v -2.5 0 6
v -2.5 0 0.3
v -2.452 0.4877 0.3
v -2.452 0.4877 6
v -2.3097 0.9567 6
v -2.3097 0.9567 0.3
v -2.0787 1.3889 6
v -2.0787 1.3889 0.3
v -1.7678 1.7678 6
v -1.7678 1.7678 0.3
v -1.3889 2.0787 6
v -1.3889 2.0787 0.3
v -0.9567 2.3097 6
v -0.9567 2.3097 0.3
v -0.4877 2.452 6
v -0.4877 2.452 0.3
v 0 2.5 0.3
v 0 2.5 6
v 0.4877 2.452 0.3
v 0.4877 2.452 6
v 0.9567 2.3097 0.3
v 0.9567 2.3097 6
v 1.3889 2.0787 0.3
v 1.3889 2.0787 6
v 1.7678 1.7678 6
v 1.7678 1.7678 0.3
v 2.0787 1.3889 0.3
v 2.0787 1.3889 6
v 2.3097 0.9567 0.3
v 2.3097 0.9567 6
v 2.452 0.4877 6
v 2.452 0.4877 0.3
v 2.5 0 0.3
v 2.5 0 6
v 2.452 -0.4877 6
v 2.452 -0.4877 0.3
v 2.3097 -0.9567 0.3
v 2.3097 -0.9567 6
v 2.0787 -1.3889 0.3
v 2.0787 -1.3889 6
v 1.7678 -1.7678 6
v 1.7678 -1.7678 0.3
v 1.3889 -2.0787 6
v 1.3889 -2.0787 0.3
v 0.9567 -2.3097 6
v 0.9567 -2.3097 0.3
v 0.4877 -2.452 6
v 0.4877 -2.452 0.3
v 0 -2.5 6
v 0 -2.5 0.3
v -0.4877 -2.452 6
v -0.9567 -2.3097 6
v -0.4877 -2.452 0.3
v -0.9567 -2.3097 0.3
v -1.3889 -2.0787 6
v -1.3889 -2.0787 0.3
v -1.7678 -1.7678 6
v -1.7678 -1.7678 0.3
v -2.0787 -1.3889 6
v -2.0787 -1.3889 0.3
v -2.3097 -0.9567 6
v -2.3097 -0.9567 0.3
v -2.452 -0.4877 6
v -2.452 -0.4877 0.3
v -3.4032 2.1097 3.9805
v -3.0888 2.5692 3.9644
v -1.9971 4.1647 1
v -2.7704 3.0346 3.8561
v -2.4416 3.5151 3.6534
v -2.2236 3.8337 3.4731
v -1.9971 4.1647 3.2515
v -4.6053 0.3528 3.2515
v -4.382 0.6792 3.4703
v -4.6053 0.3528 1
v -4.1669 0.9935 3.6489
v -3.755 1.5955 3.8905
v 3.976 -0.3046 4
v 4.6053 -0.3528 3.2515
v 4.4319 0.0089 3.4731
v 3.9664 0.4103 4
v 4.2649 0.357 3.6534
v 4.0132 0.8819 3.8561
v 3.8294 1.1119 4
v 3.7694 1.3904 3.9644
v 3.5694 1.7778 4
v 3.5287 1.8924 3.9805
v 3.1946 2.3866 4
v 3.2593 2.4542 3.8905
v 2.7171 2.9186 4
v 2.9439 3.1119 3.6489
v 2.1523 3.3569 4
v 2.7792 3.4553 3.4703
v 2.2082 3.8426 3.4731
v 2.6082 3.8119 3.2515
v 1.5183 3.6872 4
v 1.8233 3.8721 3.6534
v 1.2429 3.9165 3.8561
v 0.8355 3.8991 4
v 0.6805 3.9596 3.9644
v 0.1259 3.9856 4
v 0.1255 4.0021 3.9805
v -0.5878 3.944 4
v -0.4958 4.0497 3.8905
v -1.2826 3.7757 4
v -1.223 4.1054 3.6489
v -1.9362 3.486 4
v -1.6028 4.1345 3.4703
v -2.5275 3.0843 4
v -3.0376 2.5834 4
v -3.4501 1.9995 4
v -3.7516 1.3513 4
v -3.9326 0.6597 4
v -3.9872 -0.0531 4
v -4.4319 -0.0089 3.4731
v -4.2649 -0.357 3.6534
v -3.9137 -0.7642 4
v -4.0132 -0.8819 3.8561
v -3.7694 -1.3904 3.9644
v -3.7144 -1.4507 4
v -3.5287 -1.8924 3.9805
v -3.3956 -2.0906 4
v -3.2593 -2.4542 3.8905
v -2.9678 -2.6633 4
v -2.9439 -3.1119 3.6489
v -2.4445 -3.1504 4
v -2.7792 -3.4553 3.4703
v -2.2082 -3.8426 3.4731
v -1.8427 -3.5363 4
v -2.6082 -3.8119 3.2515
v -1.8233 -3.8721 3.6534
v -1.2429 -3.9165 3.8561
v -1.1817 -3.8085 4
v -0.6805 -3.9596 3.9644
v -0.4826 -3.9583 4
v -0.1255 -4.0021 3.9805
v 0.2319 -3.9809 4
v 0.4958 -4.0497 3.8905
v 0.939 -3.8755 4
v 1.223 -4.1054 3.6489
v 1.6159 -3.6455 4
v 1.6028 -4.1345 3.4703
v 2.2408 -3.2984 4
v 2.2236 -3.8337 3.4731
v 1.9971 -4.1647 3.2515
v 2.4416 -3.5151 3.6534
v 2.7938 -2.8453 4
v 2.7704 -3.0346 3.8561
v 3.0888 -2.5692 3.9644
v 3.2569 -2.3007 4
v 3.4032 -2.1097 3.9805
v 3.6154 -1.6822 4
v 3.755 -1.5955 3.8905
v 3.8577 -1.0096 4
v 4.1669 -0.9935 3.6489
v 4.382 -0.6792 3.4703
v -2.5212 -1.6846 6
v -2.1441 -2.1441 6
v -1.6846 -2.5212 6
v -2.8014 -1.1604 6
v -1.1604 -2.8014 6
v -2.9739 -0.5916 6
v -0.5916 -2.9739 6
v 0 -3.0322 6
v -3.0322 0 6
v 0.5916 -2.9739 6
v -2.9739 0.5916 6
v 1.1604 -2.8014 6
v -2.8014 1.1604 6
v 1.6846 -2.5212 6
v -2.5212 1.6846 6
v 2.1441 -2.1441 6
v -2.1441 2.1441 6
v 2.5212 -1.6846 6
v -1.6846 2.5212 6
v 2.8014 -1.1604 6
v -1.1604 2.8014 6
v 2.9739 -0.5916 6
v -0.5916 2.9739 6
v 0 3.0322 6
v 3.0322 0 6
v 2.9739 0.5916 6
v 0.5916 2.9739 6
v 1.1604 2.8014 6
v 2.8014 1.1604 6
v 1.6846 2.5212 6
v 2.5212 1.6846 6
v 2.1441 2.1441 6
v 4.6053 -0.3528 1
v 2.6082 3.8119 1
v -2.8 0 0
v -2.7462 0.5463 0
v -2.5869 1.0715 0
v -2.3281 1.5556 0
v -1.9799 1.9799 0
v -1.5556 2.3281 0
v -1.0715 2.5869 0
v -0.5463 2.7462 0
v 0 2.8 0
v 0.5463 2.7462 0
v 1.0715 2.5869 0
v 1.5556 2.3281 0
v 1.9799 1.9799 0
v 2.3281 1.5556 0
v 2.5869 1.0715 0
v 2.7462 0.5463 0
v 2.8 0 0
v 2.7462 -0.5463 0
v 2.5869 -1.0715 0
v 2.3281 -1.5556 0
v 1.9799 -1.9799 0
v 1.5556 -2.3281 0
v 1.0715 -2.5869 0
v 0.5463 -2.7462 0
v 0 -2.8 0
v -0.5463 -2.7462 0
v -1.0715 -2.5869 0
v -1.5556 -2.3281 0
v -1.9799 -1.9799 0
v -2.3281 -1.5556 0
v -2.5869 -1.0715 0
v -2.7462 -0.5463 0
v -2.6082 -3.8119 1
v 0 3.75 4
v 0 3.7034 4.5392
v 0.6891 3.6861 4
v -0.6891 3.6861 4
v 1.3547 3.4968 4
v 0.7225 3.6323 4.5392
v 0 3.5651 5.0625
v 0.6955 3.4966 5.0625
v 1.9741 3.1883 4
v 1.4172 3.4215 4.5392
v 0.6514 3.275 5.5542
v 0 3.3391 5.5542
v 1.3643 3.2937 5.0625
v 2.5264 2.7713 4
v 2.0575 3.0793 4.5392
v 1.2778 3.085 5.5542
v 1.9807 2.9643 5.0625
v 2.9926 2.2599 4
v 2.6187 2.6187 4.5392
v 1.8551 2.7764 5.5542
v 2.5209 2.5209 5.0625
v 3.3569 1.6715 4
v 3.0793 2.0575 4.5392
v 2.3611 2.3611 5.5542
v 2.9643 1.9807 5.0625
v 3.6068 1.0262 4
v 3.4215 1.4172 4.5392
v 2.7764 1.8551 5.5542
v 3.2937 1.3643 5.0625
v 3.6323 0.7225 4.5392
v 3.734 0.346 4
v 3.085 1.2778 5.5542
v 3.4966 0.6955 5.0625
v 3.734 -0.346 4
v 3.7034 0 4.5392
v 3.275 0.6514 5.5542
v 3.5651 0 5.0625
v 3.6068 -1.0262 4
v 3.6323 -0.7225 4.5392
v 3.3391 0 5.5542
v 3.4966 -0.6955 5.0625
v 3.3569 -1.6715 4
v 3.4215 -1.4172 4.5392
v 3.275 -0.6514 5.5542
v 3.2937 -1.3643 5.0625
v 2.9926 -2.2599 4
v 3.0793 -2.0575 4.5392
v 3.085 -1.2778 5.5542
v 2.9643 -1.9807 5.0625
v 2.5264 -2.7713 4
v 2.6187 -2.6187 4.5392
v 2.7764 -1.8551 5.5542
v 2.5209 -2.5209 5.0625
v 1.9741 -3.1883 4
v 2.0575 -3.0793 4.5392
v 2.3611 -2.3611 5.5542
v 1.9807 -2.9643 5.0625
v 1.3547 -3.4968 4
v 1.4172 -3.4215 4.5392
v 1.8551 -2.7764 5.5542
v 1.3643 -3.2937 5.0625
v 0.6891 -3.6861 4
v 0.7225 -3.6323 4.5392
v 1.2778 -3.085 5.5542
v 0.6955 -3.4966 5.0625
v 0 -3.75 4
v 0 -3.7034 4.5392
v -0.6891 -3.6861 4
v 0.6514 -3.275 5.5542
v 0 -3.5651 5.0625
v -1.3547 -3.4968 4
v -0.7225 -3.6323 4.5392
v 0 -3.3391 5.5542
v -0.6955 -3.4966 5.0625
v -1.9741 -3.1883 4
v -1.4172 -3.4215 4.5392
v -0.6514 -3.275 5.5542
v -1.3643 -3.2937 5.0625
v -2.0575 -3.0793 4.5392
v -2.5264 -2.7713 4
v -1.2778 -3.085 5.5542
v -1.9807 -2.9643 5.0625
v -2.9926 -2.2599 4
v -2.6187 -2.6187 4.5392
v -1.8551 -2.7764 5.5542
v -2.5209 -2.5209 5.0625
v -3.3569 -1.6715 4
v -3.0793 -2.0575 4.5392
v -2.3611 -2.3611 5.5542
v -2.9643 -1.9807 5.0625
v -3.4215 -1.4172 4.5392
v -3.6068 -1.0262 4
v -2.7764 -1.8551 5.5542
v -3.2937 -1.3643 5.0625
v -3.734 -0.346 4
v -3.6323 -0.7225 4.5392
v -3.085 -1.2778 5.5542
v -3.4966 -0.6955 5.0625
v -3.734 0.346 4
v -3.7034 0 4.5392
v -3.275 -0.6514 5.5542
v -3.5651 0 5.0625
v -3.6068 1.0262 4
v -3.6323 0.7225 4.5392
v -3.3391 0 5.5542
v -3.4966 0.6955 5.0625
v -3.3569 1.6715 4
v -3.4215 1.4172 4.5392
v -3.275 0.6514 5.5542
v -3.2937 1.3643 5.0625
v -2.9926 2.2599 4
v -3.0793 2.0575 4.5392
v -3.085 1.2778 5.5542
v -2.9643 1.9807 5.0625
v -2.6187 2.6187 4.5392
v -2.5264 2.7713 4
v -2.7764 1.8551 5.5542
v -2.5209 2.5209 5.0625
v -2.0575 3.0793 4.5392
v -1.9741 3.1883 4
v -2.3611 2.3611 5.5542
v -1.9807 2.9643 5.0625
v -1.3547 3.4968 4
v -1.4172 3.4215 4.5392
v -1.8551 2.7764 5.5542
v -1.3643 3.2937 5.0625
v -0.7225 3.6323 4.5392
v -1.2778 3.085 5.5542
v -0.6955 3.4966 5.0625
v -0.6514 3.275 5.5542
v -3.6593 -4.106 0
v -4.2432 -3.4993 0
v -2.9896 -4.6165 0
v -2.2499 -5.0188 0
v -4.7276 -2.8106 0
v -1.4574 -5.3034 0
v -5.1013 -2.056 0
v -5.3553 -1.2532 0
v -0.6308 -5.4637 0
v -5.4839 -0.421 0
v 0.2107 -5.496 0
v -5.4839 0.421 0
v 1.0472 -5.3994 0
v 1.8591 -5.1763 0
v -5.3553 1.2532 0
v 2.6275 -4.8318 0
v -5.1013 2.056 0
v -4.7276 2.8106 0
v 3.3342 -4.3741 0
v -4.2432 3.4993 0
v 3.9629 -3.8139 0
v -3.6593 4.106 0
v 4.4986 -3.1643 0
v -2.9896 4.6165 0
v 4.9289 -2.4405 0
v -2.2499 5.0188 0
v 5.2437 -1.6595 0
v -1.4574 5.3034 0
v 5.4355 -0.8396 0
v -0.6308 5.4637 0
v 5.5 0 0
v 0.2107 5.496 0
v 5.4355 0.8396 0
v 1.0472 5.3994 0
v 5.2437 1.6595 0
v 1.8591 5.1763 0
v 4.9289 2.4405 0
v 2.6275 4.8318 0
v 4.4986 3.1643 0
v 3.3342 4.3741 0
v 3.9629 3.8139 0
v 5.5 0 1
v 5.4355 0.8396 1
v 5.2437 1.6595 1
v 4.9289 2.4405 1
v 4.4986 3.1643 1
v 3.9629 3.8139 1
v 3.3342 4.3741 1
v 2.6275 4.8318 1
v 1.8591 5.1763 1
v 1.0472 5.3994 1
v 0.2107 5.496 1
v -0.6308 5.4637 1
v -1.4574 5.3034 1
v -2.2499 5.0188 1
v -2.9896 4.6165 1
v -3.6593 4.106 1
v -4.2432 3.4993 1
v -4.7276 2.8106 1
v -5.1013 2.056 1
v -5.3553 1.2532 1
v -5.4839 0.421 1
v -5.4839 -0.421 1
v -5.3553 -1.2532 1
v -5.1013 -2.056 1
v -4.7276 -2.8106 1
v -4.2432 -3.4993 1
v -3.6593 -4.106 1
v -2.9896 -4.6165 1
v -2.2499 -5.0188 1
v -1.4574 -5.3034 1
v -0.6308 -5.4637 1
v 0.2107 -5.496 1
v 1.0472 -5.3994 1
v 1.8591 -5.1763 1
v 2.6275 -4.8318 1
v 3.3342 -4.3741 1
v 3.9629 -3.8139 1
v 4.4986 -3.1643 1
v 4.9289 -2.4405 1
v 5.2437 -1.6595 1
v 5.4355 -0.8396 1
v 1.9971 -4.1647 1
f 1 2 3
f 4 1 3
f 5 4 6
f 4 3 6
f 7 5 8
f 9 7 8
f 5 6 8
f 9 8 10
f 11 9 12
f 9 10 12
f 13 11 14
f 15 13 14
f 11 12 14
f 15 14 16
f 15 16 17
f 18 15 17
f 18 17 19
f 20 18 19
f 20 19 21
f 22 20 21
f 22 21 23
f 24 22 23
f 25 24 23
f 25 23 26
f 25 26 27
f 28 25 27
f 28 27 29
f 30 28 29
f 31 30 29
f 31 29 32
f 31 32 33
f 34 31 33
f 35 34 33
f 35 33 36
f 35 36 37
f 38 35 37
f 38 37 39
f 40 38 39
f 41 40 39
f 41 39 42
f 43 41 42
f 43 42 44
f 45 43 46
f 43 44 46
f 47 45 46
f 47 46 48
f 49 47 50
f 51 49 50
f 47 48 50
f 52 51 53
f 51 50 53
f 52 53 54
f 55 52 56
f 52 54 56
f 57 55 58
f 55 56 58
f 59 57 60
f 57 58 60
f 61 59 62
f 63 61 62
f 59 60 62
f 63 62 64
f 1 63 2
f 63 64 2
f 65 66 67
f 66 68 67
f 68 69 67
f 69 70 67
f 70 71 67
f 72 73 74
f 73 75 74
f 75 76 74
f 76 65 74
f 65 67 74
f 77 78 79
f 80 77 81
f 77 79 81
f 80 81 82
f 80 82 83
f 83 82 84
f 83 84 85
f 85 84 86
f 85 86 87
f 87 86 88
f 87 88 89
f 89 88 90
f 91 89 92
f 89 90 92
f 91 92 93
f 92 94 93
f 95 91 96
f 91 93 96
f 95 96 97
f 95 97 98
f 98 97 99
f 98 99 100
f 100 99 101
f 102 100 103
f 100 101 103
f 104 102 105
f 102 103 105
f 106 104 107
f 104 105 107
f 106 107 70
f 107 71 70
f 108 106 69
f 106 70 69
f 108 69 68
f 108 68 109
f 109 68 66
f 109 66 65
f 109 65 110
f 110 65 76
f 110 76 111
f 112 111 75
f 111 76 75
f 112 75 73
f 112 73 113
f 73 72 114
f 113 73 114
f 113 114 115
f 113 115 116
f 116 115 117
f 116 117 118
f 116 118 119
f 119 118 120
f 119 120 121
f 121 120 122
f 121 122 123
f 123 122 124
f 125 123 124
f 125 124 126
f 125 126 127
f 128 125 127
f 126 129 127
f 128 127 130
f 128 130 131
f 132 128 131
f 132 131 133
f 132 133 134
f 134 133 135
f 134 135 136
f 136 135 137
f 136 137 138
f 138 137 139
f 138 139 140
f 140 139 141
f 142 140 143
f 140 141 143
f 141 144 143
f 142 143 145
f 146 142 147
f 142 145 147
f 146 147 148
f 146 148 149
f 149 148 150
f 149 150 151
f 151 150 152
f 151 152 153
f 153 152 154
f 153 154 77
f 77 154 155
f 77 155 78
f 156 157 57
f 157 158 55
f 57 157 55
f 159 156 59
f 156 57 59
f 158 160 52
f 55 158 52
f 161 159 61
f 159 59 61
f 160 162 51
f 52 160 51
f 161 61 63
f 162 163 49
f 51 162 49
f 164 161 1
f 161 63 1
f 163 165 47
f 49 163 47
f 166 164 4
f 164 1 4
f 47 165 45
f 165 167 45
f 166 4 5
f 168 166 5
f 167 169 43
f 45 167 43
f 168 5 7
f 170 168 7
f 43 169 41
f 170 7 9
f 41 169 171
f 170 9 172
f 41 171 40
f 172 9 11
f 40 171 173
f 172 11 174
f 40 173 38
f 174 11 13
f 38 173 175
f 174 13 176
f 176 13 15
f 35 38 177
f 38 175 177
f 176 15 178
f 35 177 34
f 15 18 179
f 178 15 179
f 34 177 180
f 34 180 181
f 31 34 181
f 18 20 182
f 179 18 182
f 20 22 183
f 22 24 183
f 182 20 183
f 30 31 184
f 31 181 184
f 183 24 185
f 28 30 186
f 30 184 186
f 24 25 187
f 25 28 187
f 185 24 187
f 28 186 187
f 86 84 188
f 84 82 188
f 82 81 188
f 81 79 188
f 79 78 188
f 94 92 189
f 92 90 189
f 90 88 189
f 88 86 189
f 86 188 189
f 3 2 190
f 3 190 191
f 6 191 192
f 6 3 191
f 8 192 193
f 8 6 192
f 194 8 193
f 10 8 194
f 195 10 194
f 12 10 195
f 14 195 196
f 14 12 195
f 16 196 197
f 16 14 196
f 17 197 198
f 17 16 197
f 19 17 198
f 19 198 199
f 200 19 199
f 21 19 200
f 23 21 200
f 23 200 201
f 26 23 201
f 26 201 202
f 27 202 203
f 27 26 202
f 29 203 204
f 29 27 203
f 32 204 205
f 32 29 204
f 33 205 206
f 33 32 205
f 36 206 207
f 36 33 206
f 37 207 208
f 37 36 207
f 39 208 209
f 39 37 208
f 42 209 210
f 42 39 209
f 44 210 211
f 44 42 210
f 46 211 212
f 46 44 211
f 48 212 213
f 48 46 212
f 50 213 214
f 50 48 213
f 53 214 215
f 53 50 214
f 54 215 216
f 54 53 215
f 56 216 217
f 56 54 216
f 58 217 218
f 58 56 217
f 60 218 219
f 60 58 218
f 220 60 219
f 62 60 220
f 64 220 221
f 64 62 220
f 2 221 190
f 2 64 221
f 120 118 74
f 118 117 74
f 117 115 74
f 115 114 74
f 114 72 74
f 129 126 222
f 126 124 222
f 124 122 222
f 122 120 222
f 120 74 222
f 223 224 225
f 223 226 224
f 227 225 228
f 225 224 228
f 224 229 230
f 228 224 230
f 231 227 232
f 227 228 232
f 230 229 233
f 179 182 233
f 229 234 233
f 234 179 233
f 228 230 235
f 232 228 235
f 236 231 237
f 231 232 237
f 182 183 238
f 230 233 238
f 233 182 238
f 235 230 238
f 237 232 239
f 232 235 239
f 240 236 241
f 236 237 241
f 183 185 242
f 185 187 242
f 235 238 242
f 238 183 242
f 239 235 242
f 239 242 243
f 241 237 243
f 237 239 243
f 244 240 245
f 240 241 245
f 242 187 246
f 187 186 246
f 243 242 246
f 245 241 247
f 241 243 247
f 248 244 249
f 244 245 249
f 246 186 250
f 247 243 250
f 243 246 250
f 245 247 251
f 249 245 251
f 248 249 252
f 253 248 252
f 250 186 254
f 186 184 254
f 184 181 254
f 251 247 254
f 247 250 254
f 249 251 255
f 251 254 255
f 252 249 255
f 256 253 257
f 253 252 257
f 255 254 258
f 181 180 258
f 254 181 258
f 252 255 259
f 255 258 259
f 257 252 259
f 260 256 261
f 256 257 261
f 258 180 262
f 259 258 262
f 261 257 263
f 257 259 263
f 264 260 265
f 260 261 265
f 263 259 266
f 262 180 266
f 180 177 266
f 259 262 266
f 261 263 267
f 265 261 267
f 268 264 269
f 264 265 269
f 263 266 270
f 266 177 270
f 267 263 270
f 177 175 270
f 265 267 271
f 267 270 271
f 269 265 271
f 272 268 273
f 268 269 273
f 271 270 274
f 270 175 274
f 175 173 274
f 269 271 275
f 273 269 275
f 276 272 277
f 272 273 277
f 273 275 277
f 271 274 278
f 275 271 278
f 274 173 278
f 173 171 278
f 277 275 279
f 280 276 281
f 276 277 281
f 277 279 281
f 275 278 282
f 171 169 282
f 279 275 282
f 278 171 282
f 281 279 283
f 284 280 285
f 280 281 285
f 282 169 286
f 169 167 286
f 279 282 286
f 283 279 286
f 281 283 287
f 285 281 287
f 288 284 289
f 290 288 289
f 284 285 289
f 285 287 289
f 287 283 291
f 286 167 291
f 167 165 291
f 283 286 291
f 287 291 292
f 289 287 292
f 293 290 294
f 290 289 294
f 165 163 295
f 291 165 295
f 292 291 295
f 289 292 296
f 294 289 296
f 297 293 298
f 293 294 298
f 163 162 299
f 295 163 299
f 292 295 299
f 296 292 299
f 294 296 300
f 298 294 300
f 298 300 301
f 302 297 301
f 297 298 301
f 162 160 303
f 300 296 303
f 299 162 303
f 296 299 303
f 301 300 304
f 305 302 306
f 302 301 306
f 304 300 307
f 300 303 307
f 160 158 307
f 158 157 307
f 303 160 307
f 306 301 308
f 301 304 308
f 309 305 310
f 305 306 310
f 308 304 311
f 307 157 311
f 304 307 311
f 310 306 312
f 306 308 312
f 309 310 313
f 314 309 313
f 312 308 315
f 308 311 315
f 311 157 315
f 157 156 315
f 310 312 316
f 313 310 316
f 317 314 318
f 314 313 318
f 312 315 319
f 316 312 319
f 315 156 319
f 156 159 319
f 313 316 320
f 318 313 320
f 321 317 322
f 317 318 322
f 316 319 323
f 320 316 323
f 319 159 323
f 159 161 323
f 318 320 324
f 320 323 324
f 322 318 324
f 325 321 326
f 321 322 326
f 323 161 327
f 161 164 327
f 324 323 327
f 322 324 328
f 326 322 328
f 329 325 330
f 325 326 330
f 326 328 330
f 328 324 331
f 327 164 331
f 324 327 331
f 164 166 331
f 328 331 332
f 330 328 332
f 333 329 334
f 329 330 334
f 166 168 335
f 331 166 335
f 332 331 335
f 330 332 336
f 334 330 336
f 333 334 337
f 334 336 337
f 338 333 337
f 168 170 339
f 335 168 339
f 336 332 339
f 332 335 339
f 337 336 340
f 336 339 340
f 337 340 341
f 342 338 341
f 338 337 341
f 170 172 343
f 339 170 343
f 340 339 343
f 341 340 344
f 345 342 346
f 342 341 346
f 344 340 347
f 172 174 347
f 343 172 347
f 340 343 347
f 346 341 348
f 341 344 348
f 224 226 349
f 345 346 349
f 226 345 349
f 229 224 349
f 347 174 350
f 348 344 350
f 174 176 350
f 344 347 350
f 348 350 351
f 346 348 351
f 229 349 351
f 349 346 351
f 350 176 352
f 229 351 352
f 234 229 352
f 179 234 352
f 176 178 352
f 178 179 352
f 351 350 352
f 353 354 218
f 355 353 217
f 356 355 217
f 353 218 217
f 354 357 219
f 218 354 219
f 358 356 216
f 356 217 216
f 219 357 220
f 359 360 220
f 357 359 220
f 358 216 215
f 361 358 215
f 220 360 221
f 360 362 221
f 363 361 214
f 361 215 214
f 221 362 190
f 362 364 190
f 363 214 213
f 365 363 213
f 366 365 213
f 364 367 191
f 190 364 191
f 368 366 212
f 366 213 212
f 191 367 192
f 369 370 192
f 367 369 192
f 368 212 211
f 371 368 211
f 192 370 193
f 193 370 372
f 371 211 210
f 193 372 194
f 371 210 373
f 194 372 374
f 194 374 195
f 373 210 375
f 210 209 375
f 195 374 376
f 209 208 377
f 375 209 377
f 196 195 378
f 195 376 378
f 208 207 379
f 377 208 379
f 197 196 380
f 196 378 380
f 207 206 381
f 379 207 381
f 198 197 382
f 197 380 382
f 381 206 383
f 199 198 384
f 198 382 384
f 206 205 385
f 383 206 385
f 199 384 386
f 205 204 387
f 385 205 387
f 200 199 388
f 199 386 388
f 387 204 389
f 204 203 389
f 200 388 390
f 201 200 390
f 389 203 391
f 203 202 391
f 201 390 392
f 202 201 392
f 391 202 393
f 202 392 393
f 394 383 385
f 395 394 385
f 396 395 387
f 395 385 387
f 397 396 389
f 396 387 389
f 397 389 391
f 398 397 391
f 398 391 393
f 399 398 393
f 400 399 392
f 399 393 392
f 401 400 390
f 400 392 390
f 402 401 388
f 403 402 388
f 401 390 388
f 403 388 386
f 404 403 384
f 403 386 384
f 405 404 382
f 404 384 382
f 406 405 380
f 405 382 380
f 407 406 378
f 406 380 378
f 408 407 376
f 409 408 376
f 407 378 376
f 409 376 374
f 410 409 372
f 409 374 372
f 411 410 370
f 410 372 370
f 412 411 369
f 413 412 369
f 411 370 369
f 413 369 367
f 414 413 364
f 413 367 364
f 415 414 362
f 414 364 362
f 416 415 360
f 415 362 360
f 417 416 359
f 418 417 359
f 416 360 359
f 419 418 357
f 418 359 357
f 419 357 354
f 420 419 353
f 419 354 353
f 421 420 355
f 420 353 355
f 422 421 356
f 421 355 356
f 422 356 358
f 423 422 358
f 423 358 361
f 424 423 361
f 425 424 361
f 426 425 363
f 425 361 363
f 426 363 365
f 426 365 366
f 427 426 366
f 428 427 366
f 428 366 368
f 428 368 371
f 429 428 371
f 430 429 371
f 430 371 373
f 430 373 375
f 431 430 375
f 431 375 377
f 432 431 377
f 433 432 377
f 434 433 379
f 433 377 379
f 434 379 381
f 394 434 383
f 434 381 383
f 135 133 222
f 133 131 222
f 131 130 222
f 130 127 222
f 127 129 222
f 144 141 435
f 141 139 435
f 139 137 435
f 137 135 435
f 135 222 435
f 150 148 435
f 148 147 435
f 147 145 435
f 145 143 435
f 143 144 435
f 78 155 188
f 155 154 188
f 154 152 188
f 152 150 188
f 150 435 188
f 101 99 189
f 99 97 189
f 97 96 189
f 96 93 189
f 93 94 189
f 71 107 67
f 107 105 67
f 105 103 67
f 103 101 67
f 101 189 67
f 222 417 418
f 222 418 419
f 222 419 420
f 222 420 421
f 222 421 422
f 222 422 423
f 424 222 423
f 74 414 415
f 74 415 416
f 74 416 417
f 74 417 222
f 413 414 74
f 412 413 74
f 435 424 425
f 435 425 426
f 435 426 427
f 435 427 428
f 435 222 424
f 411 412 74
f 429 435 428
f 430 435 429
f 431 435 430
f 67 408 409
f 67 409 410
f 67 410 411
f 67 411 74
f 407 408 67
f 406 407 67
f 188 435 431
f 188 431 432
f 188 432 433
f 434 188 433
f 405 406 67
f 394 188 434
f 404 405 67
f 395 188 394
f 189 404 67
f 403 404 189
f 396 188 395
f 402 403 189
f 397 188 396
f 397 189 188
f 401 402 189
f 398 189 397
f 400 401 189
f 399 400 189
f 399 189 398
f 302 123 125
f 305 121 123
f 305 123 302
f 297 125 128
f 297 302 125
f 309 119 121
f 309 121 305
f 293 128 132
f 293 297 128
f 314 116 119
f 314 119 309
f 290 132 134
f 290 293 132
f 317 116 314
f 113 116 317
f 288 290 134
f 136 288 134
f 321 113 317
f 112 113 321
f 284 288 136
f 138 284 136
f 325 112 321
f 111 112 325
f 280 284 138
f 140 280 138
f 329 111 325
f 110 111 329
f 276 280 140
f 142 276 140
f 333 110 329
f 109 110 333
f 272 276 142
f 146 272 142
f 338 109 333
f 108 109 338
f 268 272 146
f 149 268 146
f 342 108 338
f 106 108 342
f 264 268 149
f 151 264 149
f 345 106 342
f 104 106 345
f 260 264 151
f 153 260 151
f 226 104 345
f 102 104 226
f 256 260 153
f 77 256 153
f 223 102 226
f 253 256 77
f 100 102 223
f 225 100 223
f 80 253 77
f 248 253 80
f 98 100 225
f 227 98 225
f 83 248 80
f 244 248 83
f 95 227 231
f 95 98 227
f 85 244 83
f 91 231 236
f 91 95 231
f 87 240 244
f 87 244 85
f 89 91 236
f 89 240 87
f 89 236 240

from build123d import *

# Parameters (mm, degrees)
SKETCH_1_R          = 5.5
EXTRUDE_1_DEPTH     = 1
EXTRUDE_2_DEPTH     = 3
CUT_EXTRUDE_2_REACH = 8
SKETCH_9_R          = 2.5
CHAMFER_1_SIZE      = 0.3


with BuildPart() as part:
    # Эскиз1 → Бобышка-Вытянуть1 (new body)
    with BuildSketch(Plane.XY):
        Circle(SKETCH_1_R)
    extrude(amount=EXTRUDE_1_DEPTH)

    # Эскиз3 → Бобышка-Вытянуть2 (add)
    with BuildSketch(Plane.XY.offset(1)):
        Polygon((2.608163285, 3.811930956), (-1.997147402, 4.16470114), (-4.605310688, 0.352770185), (-2.608163285, -3.811930956), (1.997147402, -4.16470114), (4.605310688, -0.352770185), align=None)
    extrude(amount=EXTRUDE_2_DEPTH)

    # Эскиз5 → Вырез-Повернуть3 (revolve, cut)
    with BuildSketch(Plane(origin=(0, 0, 0), x_dir=(-0.997079012, 0.076376985, 0), z_dir=(-0.076376985, -0.997079012, 0))):
        Polygon((-4.618802154, -3.251492454), (-4.618802154, -4), (-3.987599163, -4), align=None)
    revolve(axis=Axis((0, 0, 0), (0, 0, 1)), mode=Mode.SUBTRACT)

    # Эскиз6 → Повернуть1 (revolve)
    with BuildSketch(Plane(origin=(0, 0, 0), x_dir=(0, 0, -1), z_dir=(1, 0, 0))):
        with BuildLine():
            Line((-4, 0), (-4, 3.75))
            ThreePointArc((-4, 3.75), (-5.062452688, 3.565118621), (-6, 3.032209738))
            Line((-6, 3.032209738), (-6, 0))
            Line((-6, 0), (-4, 0))
        make_face()
    revolve(axis=Axis((0, 0, 0.929807333), (0, 0, -1)))

    # Эскиз9 → Вырез-Вытянуть2 (cut, up to next)
    with BuildSketch(Plane(origin=(0, 0, 0), x_dir=(-1, 0, 0), z_dir=(0, 0, -1)), mode=Mode.PRIVATE) as cut_extrude_2_sk1:
        Circle(SKETCH_9_R)
    cut_extrude_2_tool1 = extrude(cut_extrude_2_sk1.sketch, amount=-CUT_EXTRUDE_2_REACH, mode=Mode.PRIVATE) & part.part
    add(cut_extrude_2_tool1.solids().sort_by_distance((0, 0, 0))[0], mode=Mode.SUBTRACT)

    # Фаска1
    chamfer_1_edges = [part.edges().sort_by_distance(p)[0] for p in [
        (2.5, 0, 0),
    ]]
    chamfer(chamfer_1_edges, length=CHAMFER_1_SIZE)


solid = part.part
